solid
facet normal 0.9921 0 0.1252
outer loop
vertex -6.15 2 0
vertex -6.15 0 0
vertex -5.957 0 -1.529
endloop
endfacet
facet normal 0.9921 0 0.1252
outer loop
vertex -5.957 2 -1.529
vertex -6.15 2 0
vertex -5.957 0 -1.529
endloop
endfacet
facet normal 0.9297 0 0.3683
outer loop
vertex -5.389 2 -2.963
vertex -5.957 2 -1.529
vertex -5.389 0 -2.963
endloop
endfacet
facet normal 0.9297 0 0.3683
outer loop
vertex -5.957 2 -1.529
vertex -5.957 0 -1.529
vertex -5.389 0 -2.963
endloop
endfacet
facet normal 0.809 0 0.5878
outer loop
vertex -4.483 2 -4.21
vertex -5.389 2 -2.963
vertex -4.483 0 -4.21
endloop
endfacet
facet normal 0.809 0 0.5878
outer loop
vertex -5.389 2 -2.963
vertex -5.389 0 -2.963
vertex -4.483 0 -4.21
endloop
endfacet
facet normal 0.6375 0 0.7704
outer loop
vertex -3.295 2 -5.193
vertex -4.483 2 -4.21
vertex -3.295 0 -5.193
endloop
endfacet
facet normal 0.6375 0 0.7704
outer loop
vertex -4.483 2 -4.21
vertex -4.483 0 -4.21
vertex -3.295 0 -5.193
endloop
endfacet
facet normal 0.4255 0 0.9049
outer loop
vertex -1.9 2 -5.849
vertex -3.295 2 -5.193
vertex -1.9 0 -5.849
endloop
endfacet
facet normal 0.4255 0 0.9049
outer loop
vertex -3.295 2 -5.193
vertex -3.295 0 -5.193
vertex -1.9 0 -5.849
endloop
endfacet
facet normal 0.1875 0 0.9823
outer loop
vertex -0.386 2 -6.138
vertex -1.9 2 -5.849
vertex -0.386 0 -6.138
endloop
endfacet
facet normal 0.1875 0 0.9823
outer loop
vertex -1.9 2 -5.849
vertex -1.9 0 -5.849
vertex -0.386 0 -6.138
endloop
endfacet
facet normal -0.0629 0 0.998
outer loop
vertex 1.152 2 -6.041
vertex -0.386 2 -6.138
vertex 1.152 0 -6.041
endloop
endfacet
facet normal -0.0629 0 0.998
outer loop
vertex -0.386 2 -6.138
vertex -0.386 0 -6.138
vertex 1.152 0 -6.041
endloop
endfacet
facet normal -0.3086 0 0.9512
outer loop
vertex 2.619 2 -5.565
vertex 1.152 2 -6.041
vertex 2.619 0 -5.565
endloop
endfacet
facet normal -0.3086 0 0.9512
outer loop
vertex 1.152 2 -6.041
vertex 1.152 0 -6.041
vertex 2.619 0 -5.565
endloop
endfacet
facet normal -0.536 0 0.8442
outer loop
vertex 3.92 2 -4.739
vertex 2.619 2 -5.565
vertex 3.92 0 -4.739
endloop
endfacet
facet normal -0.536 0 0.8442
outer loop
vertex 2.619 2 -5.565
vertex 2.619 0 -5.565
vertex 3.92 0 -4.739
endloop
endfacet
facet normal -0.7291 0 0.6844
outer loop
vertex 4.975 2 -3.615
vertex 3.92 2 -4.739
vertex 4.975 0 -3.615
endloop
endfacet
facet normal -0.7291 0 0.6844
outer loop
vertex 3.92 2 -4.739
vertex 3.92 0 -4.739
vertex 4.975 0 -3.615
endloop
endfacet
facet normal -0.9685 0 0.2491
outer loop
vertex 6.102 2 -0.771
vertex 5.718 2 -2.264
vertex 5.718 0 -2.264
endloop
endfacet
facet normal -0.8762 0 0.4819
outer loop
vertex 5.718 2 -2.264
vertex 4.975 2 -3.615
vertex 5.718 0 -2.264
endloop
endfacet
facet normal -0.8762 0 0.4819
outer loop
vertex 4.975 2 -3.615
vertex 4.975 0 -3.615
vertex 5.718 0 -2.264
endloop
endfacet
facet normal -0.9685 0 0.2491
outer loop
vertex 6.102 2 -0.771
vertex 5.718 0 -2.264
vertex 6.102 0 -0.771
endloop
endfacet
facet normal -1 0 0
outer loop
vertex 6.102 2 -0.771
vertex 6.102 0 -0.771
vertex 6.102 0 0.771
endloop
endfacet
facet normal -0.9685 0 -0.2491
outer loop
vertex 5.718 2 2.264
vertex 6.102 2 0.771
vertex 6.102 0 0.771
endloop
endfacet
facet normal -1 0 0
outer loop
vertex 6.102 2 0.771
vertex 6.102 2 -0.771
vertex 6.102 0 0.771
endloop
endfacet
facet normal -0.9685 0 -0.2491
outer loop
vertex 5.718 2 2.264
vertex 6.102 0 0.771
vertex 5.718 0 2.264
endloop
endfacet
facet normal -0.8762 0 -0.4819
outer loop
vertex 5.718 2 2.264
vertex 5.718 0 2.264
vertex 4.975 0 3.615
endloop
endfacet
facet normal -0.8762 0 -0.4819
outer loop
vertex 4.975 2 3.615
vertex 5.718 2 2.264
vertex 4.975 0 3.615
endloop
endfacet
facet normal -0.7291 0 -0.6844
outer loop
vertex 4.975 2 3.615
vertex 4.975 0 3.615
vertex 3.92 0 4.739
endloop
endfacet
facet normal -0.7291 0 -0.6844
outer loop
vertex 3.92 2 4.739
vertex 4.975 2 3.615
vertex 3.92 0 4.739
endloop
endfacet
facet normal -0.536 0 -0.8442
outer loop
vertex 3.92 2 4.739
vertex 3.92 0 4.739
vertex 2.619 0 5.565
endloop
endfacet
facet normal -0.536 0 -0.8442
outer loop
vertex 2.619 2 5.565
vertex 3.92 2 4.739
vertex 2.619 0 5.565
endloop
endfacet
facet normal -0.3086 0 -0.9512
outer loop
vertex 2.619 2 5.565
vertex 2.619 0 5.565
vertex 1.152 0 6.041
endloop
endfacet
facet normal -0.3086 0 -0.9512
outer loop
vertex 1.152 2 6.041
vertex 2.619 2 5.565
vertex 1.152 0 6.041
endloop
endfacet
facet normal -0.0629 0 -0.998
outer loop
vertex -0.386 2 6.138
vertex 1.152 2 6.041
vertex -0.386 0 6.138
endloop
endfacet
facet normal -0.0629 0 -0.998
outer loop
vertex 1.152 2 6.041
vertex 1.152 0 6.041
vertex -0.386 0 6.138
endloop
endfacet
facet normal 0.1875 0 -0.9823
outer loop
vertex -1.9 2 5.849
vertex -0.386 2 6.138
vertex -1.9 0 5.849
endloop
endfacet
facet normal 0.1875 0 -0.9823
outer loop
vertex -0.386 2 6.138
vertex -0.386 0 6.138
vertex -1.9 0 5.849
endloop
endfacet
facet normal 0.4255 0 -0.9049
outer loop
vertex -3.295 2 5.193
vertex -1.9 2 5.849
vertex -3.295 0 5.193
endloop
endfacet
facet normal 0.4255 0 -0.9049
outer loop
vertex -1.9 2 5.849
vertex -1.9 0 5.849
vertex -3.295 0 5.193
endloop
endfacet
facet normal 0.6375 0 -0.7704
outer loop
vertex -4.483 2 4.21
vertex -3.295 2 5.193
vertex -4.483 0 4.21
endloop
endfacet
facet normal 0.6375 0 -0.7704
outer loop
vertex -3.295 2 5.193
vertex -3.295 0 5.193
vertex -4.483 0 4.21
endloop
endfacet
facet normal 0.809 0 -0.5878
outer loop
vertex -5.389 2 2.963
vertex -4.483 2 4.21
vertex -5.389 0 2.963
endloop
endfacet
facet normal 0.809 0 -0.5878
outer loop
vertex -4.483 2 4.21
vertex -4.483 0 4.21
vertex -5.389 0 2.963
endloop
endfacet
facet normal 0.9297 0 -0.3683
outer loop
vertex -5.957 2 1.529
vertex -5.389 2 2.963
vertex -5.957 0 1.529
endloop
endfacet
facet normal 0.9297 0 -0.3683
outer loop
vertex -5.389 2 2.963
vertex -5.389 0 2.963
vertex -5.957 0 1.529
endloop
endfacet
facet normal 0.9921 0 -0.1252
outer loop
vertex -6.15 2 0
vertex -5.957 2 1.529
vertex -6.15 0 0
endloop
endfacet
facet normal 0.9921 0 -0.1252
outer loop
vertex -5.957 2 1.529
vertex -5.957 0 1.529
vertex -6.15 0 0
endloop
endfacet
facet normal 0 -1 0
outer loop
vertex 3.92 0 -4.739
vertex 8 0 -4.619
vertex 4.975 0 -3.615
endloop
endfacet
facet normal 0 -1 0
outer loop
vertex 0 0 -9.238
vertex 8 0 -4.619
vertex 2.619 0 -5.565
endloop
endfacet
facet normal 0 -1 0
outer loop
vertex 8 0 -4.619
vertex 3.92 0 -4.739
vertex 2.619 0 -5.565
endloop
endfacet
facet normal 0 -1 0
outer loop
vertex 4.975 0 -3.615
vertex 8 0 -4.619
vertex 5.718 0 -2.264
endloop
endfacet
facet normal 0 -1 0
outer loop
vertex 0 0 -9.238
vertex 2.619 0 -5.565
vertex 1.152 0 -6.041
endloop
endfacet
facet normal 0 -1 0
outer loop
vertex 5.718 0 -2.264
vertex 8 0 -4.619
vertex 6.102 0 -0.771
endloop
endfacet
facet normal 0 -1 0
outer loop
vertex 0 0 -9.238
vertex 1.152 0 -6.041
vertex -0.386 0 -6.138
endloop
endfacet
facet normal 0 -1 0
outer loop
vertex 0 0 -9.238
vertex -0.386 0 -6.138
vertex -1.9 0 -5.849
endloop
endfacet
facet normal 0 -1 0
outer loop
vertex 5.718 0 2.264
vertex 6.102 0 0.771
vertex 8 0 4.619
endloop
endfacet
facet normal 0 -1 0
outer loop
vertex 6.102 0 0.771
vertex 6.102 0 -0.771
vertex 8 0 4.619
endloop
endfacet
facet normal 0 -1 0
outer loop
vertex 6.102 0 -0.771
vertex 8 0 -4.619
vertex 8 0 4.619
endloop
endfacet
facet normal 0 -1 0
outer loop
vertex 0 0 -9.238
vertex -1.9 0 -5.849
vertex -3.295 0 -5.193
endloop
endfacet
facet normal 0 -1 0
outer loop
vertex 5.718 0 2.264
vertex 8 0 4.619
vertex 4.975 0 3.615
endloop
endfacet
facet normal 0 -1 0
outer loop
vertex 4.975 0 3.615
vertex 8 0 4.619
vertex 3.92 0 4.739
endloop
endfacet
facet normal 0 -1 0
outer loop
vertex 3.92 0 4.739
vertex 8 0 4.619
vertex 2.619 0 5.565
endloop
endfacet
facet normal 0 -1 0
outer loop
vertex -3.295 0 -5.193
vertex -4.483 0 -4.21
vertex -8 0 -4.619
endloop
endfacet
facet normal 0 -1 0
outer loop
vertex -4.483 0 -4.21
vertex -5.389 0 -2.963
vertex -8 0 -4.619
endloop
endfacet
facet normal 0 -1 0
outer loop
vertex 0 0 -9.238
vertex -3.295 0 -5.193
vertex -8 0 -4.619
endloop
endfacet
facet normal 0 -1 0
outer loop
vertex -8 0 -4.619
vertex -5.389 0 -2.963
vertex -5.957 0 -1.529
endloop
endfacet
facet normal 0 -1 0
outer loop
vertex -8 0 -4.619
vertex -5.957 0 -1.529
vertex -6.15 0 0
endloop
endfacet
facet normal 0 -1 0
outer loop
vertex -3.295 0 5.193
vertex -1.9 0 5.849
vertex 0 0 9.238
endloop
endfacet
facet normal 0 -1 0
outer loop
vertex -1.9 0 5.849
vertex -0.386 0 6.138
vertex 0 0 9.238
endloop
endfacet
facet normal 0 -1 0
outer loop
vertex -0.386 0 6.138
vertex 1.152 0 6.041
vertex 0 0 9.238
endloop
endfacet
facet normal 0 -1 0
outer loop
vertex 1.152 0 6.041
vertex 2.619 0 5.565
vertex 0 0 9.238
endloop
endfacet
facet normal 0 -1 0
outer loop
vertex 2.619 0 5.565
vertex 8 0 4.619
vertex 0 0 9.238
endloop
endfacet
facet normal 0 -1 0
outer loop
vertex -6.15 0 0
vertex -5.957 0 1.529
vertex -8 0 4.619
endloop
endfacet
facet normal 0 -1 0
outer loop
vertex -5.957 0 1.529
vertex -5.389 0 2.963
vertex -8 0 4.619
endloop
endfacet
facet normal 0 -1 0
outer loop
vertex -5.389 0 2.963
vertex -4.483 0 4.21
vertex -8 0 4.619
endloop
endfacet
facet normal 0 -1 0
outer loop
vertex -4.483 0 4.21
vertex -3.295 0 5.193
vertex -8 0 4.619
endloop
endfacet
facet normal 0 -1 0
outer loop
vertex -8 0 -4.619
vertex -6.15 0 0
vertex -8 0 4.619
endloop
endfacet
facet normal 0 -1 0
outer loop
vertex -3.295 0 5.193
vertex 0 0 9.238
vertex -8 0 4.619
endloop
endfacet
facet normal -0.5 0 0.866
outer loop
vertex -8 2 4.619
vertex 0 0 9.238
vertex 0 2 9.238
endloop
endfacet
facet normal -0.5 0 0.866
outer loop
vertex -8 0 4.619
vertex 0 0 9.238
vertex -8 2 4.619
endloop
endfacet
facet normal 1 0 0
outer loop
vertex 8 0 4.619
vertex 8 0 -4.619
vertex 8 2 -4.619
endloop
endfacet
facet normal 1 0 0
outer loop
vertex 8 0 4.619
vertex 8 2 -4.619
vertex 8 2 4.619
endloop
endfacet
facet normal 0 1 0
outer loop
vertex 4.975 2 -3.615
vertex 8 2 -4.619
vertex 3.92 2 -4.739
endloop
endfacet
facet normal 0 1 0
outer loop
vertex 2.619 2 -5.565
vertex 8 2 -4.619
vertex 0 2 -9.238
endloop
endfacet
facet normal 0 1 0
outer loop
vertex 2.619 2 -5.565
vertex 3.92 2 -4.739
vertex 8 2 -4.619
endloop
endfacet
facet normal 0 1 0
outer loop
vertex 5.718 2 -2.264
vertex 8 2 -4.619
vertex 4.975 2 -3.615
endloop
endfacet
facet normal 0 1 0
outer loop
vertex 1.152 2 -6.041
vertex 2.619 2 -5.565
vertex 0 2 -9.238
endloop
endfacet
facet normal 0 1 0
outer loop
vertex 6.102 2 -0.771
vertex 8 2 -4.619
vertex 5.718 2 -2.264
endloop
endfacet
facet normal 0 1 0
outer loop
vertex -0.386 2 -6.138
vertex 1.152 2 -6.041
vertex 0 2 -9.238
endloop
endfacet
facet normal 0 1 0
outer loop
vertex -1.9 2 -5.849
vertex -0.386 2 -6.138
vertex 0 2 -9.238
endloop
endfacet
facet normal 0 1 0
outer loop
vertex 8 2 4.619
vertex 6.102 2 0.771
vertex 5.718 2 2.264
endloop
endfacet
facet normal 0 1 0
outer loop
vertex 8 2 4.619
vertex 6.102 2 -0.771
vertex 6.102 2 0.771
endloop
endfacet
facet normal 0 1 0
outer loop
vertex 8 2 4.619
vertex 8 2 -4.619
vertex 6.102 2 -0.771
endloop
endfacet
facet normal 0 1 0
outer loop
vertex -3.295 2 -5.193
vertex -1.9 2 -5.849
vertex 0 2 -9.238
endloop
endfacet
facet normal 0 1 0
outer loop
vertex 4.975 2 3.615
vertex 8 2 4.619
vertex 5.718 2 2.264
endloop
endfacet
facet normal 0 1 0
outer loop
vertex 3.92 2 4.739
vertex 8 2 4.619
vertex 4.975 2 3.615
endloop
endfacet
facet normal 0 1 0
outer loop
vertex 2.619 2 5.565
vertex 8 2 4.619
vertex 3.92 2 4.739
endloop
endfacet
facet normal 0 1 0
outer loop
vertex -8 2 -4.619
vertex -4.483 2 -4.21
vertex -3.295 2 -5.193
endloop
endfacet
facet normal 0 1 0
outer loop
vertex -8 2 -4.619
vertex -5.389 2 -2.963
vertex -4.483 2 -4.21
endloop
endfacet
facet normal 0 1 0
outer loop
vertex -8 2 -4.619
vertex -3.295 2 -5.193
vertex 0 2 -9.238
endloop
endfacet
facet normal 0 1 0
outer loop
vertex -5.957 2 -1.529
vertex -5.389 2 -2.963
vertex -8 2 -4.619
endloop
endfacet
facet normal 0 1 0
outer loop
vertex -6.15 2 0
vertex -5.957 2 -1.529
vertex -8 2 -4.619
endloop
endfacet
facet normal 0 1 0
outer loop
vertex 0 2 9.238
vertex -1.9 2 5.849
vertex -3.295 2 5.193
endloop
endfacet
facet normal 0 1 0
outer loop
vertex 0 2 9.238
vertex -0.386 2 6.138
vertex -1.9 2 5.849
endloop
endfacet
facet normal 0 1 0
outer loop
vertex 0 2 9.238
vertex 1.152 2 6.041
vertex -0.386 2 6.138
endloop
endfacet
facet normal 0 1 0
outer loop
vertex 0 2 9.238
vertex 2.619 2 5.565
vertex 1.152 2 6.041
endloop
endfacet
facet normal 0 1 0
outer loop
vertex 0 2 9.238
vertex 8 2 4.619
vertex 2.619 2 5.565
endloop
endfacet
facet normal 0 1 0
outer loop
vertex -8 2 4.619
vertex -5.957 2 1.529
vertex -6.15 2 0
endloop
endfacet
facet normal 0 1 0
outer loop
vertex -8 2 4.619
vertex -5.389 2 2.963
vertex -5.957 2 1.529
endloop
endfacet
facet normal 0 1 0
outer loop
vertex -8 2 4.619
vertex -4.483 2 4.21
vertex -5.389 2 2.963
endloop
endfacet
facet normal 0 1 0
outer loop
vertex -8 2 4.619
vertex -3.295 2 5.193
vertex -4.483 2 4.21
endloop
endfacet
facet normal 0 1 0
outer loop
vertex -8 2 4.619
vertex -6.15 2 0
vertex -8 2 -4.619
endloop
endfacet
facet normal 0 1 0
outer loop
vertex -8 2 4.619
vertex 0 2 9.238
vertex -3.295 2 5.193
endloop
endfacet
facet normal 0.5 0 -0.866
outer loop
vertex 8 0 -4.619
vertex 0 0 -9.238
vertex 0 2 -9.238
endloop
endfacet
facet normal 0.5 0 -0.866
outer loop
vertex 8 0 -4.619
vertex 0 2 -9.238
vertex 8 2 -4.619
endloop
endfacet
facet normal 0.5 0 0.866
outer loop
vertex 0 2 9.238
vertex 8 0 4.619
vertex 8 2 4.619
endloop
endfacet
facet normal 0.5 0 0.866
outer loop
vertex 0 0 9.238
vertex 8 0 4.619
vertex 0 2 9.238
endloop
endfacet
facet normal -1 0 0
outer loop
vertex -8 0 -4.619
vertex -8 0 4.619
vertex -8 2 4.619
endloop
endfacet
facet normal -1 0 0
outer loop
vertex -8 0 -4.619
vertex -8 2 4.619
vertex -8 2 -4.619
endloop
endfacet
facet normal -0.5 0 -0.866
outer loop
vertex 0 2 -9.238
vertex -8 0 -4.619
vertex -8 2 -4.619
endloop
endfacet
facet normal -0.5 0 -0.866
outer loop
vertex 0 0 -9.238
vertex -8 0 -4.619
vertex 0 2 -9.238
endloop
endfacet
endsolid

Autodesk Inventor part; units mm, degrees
ref_plane "YZ Plane" through (0, 0, 0) normal (1, 0, 0) x (0, 1, 0)
ref_plane "XZ Plane" through (0, 0, 0) normal (0, 1, 0) x (-1, 0, 0)
ref_plane "XY Plane" through (0, 0, 0) normal (0, 0, 1) x (1, 0, 0)
sketch "Sketch1" plane through (0, 0, 0) normal (0, 1, 0) x (-1, 0, 0)
  circle A0 centre (0, 0) radius 6.15
  line L0 (0, -9.2376) -> (-8, -4.6188)
  line L1 (-8, -4.6188) -> (-8, 4.6188)
  line L2 (-8, 4.6188) -> (0, 9.2376)
  line L3 (0, 9.2376) -> (8, 4.6188)
  line L4 (8, 4.6188) -> (8, -4.6188)
  line L5 (8, -4.6188) -> (0, -9.2376)
  dimension "d0" = 12.3
  dimension "d1" = 16
extrude "Extrusion1" add sketch "Sketch1" along normal blind 2
thread "Thread1" size "M14x2" class "6H" standard "ANSI Metric M Profile" full length
properties part number "Switch Nut"
